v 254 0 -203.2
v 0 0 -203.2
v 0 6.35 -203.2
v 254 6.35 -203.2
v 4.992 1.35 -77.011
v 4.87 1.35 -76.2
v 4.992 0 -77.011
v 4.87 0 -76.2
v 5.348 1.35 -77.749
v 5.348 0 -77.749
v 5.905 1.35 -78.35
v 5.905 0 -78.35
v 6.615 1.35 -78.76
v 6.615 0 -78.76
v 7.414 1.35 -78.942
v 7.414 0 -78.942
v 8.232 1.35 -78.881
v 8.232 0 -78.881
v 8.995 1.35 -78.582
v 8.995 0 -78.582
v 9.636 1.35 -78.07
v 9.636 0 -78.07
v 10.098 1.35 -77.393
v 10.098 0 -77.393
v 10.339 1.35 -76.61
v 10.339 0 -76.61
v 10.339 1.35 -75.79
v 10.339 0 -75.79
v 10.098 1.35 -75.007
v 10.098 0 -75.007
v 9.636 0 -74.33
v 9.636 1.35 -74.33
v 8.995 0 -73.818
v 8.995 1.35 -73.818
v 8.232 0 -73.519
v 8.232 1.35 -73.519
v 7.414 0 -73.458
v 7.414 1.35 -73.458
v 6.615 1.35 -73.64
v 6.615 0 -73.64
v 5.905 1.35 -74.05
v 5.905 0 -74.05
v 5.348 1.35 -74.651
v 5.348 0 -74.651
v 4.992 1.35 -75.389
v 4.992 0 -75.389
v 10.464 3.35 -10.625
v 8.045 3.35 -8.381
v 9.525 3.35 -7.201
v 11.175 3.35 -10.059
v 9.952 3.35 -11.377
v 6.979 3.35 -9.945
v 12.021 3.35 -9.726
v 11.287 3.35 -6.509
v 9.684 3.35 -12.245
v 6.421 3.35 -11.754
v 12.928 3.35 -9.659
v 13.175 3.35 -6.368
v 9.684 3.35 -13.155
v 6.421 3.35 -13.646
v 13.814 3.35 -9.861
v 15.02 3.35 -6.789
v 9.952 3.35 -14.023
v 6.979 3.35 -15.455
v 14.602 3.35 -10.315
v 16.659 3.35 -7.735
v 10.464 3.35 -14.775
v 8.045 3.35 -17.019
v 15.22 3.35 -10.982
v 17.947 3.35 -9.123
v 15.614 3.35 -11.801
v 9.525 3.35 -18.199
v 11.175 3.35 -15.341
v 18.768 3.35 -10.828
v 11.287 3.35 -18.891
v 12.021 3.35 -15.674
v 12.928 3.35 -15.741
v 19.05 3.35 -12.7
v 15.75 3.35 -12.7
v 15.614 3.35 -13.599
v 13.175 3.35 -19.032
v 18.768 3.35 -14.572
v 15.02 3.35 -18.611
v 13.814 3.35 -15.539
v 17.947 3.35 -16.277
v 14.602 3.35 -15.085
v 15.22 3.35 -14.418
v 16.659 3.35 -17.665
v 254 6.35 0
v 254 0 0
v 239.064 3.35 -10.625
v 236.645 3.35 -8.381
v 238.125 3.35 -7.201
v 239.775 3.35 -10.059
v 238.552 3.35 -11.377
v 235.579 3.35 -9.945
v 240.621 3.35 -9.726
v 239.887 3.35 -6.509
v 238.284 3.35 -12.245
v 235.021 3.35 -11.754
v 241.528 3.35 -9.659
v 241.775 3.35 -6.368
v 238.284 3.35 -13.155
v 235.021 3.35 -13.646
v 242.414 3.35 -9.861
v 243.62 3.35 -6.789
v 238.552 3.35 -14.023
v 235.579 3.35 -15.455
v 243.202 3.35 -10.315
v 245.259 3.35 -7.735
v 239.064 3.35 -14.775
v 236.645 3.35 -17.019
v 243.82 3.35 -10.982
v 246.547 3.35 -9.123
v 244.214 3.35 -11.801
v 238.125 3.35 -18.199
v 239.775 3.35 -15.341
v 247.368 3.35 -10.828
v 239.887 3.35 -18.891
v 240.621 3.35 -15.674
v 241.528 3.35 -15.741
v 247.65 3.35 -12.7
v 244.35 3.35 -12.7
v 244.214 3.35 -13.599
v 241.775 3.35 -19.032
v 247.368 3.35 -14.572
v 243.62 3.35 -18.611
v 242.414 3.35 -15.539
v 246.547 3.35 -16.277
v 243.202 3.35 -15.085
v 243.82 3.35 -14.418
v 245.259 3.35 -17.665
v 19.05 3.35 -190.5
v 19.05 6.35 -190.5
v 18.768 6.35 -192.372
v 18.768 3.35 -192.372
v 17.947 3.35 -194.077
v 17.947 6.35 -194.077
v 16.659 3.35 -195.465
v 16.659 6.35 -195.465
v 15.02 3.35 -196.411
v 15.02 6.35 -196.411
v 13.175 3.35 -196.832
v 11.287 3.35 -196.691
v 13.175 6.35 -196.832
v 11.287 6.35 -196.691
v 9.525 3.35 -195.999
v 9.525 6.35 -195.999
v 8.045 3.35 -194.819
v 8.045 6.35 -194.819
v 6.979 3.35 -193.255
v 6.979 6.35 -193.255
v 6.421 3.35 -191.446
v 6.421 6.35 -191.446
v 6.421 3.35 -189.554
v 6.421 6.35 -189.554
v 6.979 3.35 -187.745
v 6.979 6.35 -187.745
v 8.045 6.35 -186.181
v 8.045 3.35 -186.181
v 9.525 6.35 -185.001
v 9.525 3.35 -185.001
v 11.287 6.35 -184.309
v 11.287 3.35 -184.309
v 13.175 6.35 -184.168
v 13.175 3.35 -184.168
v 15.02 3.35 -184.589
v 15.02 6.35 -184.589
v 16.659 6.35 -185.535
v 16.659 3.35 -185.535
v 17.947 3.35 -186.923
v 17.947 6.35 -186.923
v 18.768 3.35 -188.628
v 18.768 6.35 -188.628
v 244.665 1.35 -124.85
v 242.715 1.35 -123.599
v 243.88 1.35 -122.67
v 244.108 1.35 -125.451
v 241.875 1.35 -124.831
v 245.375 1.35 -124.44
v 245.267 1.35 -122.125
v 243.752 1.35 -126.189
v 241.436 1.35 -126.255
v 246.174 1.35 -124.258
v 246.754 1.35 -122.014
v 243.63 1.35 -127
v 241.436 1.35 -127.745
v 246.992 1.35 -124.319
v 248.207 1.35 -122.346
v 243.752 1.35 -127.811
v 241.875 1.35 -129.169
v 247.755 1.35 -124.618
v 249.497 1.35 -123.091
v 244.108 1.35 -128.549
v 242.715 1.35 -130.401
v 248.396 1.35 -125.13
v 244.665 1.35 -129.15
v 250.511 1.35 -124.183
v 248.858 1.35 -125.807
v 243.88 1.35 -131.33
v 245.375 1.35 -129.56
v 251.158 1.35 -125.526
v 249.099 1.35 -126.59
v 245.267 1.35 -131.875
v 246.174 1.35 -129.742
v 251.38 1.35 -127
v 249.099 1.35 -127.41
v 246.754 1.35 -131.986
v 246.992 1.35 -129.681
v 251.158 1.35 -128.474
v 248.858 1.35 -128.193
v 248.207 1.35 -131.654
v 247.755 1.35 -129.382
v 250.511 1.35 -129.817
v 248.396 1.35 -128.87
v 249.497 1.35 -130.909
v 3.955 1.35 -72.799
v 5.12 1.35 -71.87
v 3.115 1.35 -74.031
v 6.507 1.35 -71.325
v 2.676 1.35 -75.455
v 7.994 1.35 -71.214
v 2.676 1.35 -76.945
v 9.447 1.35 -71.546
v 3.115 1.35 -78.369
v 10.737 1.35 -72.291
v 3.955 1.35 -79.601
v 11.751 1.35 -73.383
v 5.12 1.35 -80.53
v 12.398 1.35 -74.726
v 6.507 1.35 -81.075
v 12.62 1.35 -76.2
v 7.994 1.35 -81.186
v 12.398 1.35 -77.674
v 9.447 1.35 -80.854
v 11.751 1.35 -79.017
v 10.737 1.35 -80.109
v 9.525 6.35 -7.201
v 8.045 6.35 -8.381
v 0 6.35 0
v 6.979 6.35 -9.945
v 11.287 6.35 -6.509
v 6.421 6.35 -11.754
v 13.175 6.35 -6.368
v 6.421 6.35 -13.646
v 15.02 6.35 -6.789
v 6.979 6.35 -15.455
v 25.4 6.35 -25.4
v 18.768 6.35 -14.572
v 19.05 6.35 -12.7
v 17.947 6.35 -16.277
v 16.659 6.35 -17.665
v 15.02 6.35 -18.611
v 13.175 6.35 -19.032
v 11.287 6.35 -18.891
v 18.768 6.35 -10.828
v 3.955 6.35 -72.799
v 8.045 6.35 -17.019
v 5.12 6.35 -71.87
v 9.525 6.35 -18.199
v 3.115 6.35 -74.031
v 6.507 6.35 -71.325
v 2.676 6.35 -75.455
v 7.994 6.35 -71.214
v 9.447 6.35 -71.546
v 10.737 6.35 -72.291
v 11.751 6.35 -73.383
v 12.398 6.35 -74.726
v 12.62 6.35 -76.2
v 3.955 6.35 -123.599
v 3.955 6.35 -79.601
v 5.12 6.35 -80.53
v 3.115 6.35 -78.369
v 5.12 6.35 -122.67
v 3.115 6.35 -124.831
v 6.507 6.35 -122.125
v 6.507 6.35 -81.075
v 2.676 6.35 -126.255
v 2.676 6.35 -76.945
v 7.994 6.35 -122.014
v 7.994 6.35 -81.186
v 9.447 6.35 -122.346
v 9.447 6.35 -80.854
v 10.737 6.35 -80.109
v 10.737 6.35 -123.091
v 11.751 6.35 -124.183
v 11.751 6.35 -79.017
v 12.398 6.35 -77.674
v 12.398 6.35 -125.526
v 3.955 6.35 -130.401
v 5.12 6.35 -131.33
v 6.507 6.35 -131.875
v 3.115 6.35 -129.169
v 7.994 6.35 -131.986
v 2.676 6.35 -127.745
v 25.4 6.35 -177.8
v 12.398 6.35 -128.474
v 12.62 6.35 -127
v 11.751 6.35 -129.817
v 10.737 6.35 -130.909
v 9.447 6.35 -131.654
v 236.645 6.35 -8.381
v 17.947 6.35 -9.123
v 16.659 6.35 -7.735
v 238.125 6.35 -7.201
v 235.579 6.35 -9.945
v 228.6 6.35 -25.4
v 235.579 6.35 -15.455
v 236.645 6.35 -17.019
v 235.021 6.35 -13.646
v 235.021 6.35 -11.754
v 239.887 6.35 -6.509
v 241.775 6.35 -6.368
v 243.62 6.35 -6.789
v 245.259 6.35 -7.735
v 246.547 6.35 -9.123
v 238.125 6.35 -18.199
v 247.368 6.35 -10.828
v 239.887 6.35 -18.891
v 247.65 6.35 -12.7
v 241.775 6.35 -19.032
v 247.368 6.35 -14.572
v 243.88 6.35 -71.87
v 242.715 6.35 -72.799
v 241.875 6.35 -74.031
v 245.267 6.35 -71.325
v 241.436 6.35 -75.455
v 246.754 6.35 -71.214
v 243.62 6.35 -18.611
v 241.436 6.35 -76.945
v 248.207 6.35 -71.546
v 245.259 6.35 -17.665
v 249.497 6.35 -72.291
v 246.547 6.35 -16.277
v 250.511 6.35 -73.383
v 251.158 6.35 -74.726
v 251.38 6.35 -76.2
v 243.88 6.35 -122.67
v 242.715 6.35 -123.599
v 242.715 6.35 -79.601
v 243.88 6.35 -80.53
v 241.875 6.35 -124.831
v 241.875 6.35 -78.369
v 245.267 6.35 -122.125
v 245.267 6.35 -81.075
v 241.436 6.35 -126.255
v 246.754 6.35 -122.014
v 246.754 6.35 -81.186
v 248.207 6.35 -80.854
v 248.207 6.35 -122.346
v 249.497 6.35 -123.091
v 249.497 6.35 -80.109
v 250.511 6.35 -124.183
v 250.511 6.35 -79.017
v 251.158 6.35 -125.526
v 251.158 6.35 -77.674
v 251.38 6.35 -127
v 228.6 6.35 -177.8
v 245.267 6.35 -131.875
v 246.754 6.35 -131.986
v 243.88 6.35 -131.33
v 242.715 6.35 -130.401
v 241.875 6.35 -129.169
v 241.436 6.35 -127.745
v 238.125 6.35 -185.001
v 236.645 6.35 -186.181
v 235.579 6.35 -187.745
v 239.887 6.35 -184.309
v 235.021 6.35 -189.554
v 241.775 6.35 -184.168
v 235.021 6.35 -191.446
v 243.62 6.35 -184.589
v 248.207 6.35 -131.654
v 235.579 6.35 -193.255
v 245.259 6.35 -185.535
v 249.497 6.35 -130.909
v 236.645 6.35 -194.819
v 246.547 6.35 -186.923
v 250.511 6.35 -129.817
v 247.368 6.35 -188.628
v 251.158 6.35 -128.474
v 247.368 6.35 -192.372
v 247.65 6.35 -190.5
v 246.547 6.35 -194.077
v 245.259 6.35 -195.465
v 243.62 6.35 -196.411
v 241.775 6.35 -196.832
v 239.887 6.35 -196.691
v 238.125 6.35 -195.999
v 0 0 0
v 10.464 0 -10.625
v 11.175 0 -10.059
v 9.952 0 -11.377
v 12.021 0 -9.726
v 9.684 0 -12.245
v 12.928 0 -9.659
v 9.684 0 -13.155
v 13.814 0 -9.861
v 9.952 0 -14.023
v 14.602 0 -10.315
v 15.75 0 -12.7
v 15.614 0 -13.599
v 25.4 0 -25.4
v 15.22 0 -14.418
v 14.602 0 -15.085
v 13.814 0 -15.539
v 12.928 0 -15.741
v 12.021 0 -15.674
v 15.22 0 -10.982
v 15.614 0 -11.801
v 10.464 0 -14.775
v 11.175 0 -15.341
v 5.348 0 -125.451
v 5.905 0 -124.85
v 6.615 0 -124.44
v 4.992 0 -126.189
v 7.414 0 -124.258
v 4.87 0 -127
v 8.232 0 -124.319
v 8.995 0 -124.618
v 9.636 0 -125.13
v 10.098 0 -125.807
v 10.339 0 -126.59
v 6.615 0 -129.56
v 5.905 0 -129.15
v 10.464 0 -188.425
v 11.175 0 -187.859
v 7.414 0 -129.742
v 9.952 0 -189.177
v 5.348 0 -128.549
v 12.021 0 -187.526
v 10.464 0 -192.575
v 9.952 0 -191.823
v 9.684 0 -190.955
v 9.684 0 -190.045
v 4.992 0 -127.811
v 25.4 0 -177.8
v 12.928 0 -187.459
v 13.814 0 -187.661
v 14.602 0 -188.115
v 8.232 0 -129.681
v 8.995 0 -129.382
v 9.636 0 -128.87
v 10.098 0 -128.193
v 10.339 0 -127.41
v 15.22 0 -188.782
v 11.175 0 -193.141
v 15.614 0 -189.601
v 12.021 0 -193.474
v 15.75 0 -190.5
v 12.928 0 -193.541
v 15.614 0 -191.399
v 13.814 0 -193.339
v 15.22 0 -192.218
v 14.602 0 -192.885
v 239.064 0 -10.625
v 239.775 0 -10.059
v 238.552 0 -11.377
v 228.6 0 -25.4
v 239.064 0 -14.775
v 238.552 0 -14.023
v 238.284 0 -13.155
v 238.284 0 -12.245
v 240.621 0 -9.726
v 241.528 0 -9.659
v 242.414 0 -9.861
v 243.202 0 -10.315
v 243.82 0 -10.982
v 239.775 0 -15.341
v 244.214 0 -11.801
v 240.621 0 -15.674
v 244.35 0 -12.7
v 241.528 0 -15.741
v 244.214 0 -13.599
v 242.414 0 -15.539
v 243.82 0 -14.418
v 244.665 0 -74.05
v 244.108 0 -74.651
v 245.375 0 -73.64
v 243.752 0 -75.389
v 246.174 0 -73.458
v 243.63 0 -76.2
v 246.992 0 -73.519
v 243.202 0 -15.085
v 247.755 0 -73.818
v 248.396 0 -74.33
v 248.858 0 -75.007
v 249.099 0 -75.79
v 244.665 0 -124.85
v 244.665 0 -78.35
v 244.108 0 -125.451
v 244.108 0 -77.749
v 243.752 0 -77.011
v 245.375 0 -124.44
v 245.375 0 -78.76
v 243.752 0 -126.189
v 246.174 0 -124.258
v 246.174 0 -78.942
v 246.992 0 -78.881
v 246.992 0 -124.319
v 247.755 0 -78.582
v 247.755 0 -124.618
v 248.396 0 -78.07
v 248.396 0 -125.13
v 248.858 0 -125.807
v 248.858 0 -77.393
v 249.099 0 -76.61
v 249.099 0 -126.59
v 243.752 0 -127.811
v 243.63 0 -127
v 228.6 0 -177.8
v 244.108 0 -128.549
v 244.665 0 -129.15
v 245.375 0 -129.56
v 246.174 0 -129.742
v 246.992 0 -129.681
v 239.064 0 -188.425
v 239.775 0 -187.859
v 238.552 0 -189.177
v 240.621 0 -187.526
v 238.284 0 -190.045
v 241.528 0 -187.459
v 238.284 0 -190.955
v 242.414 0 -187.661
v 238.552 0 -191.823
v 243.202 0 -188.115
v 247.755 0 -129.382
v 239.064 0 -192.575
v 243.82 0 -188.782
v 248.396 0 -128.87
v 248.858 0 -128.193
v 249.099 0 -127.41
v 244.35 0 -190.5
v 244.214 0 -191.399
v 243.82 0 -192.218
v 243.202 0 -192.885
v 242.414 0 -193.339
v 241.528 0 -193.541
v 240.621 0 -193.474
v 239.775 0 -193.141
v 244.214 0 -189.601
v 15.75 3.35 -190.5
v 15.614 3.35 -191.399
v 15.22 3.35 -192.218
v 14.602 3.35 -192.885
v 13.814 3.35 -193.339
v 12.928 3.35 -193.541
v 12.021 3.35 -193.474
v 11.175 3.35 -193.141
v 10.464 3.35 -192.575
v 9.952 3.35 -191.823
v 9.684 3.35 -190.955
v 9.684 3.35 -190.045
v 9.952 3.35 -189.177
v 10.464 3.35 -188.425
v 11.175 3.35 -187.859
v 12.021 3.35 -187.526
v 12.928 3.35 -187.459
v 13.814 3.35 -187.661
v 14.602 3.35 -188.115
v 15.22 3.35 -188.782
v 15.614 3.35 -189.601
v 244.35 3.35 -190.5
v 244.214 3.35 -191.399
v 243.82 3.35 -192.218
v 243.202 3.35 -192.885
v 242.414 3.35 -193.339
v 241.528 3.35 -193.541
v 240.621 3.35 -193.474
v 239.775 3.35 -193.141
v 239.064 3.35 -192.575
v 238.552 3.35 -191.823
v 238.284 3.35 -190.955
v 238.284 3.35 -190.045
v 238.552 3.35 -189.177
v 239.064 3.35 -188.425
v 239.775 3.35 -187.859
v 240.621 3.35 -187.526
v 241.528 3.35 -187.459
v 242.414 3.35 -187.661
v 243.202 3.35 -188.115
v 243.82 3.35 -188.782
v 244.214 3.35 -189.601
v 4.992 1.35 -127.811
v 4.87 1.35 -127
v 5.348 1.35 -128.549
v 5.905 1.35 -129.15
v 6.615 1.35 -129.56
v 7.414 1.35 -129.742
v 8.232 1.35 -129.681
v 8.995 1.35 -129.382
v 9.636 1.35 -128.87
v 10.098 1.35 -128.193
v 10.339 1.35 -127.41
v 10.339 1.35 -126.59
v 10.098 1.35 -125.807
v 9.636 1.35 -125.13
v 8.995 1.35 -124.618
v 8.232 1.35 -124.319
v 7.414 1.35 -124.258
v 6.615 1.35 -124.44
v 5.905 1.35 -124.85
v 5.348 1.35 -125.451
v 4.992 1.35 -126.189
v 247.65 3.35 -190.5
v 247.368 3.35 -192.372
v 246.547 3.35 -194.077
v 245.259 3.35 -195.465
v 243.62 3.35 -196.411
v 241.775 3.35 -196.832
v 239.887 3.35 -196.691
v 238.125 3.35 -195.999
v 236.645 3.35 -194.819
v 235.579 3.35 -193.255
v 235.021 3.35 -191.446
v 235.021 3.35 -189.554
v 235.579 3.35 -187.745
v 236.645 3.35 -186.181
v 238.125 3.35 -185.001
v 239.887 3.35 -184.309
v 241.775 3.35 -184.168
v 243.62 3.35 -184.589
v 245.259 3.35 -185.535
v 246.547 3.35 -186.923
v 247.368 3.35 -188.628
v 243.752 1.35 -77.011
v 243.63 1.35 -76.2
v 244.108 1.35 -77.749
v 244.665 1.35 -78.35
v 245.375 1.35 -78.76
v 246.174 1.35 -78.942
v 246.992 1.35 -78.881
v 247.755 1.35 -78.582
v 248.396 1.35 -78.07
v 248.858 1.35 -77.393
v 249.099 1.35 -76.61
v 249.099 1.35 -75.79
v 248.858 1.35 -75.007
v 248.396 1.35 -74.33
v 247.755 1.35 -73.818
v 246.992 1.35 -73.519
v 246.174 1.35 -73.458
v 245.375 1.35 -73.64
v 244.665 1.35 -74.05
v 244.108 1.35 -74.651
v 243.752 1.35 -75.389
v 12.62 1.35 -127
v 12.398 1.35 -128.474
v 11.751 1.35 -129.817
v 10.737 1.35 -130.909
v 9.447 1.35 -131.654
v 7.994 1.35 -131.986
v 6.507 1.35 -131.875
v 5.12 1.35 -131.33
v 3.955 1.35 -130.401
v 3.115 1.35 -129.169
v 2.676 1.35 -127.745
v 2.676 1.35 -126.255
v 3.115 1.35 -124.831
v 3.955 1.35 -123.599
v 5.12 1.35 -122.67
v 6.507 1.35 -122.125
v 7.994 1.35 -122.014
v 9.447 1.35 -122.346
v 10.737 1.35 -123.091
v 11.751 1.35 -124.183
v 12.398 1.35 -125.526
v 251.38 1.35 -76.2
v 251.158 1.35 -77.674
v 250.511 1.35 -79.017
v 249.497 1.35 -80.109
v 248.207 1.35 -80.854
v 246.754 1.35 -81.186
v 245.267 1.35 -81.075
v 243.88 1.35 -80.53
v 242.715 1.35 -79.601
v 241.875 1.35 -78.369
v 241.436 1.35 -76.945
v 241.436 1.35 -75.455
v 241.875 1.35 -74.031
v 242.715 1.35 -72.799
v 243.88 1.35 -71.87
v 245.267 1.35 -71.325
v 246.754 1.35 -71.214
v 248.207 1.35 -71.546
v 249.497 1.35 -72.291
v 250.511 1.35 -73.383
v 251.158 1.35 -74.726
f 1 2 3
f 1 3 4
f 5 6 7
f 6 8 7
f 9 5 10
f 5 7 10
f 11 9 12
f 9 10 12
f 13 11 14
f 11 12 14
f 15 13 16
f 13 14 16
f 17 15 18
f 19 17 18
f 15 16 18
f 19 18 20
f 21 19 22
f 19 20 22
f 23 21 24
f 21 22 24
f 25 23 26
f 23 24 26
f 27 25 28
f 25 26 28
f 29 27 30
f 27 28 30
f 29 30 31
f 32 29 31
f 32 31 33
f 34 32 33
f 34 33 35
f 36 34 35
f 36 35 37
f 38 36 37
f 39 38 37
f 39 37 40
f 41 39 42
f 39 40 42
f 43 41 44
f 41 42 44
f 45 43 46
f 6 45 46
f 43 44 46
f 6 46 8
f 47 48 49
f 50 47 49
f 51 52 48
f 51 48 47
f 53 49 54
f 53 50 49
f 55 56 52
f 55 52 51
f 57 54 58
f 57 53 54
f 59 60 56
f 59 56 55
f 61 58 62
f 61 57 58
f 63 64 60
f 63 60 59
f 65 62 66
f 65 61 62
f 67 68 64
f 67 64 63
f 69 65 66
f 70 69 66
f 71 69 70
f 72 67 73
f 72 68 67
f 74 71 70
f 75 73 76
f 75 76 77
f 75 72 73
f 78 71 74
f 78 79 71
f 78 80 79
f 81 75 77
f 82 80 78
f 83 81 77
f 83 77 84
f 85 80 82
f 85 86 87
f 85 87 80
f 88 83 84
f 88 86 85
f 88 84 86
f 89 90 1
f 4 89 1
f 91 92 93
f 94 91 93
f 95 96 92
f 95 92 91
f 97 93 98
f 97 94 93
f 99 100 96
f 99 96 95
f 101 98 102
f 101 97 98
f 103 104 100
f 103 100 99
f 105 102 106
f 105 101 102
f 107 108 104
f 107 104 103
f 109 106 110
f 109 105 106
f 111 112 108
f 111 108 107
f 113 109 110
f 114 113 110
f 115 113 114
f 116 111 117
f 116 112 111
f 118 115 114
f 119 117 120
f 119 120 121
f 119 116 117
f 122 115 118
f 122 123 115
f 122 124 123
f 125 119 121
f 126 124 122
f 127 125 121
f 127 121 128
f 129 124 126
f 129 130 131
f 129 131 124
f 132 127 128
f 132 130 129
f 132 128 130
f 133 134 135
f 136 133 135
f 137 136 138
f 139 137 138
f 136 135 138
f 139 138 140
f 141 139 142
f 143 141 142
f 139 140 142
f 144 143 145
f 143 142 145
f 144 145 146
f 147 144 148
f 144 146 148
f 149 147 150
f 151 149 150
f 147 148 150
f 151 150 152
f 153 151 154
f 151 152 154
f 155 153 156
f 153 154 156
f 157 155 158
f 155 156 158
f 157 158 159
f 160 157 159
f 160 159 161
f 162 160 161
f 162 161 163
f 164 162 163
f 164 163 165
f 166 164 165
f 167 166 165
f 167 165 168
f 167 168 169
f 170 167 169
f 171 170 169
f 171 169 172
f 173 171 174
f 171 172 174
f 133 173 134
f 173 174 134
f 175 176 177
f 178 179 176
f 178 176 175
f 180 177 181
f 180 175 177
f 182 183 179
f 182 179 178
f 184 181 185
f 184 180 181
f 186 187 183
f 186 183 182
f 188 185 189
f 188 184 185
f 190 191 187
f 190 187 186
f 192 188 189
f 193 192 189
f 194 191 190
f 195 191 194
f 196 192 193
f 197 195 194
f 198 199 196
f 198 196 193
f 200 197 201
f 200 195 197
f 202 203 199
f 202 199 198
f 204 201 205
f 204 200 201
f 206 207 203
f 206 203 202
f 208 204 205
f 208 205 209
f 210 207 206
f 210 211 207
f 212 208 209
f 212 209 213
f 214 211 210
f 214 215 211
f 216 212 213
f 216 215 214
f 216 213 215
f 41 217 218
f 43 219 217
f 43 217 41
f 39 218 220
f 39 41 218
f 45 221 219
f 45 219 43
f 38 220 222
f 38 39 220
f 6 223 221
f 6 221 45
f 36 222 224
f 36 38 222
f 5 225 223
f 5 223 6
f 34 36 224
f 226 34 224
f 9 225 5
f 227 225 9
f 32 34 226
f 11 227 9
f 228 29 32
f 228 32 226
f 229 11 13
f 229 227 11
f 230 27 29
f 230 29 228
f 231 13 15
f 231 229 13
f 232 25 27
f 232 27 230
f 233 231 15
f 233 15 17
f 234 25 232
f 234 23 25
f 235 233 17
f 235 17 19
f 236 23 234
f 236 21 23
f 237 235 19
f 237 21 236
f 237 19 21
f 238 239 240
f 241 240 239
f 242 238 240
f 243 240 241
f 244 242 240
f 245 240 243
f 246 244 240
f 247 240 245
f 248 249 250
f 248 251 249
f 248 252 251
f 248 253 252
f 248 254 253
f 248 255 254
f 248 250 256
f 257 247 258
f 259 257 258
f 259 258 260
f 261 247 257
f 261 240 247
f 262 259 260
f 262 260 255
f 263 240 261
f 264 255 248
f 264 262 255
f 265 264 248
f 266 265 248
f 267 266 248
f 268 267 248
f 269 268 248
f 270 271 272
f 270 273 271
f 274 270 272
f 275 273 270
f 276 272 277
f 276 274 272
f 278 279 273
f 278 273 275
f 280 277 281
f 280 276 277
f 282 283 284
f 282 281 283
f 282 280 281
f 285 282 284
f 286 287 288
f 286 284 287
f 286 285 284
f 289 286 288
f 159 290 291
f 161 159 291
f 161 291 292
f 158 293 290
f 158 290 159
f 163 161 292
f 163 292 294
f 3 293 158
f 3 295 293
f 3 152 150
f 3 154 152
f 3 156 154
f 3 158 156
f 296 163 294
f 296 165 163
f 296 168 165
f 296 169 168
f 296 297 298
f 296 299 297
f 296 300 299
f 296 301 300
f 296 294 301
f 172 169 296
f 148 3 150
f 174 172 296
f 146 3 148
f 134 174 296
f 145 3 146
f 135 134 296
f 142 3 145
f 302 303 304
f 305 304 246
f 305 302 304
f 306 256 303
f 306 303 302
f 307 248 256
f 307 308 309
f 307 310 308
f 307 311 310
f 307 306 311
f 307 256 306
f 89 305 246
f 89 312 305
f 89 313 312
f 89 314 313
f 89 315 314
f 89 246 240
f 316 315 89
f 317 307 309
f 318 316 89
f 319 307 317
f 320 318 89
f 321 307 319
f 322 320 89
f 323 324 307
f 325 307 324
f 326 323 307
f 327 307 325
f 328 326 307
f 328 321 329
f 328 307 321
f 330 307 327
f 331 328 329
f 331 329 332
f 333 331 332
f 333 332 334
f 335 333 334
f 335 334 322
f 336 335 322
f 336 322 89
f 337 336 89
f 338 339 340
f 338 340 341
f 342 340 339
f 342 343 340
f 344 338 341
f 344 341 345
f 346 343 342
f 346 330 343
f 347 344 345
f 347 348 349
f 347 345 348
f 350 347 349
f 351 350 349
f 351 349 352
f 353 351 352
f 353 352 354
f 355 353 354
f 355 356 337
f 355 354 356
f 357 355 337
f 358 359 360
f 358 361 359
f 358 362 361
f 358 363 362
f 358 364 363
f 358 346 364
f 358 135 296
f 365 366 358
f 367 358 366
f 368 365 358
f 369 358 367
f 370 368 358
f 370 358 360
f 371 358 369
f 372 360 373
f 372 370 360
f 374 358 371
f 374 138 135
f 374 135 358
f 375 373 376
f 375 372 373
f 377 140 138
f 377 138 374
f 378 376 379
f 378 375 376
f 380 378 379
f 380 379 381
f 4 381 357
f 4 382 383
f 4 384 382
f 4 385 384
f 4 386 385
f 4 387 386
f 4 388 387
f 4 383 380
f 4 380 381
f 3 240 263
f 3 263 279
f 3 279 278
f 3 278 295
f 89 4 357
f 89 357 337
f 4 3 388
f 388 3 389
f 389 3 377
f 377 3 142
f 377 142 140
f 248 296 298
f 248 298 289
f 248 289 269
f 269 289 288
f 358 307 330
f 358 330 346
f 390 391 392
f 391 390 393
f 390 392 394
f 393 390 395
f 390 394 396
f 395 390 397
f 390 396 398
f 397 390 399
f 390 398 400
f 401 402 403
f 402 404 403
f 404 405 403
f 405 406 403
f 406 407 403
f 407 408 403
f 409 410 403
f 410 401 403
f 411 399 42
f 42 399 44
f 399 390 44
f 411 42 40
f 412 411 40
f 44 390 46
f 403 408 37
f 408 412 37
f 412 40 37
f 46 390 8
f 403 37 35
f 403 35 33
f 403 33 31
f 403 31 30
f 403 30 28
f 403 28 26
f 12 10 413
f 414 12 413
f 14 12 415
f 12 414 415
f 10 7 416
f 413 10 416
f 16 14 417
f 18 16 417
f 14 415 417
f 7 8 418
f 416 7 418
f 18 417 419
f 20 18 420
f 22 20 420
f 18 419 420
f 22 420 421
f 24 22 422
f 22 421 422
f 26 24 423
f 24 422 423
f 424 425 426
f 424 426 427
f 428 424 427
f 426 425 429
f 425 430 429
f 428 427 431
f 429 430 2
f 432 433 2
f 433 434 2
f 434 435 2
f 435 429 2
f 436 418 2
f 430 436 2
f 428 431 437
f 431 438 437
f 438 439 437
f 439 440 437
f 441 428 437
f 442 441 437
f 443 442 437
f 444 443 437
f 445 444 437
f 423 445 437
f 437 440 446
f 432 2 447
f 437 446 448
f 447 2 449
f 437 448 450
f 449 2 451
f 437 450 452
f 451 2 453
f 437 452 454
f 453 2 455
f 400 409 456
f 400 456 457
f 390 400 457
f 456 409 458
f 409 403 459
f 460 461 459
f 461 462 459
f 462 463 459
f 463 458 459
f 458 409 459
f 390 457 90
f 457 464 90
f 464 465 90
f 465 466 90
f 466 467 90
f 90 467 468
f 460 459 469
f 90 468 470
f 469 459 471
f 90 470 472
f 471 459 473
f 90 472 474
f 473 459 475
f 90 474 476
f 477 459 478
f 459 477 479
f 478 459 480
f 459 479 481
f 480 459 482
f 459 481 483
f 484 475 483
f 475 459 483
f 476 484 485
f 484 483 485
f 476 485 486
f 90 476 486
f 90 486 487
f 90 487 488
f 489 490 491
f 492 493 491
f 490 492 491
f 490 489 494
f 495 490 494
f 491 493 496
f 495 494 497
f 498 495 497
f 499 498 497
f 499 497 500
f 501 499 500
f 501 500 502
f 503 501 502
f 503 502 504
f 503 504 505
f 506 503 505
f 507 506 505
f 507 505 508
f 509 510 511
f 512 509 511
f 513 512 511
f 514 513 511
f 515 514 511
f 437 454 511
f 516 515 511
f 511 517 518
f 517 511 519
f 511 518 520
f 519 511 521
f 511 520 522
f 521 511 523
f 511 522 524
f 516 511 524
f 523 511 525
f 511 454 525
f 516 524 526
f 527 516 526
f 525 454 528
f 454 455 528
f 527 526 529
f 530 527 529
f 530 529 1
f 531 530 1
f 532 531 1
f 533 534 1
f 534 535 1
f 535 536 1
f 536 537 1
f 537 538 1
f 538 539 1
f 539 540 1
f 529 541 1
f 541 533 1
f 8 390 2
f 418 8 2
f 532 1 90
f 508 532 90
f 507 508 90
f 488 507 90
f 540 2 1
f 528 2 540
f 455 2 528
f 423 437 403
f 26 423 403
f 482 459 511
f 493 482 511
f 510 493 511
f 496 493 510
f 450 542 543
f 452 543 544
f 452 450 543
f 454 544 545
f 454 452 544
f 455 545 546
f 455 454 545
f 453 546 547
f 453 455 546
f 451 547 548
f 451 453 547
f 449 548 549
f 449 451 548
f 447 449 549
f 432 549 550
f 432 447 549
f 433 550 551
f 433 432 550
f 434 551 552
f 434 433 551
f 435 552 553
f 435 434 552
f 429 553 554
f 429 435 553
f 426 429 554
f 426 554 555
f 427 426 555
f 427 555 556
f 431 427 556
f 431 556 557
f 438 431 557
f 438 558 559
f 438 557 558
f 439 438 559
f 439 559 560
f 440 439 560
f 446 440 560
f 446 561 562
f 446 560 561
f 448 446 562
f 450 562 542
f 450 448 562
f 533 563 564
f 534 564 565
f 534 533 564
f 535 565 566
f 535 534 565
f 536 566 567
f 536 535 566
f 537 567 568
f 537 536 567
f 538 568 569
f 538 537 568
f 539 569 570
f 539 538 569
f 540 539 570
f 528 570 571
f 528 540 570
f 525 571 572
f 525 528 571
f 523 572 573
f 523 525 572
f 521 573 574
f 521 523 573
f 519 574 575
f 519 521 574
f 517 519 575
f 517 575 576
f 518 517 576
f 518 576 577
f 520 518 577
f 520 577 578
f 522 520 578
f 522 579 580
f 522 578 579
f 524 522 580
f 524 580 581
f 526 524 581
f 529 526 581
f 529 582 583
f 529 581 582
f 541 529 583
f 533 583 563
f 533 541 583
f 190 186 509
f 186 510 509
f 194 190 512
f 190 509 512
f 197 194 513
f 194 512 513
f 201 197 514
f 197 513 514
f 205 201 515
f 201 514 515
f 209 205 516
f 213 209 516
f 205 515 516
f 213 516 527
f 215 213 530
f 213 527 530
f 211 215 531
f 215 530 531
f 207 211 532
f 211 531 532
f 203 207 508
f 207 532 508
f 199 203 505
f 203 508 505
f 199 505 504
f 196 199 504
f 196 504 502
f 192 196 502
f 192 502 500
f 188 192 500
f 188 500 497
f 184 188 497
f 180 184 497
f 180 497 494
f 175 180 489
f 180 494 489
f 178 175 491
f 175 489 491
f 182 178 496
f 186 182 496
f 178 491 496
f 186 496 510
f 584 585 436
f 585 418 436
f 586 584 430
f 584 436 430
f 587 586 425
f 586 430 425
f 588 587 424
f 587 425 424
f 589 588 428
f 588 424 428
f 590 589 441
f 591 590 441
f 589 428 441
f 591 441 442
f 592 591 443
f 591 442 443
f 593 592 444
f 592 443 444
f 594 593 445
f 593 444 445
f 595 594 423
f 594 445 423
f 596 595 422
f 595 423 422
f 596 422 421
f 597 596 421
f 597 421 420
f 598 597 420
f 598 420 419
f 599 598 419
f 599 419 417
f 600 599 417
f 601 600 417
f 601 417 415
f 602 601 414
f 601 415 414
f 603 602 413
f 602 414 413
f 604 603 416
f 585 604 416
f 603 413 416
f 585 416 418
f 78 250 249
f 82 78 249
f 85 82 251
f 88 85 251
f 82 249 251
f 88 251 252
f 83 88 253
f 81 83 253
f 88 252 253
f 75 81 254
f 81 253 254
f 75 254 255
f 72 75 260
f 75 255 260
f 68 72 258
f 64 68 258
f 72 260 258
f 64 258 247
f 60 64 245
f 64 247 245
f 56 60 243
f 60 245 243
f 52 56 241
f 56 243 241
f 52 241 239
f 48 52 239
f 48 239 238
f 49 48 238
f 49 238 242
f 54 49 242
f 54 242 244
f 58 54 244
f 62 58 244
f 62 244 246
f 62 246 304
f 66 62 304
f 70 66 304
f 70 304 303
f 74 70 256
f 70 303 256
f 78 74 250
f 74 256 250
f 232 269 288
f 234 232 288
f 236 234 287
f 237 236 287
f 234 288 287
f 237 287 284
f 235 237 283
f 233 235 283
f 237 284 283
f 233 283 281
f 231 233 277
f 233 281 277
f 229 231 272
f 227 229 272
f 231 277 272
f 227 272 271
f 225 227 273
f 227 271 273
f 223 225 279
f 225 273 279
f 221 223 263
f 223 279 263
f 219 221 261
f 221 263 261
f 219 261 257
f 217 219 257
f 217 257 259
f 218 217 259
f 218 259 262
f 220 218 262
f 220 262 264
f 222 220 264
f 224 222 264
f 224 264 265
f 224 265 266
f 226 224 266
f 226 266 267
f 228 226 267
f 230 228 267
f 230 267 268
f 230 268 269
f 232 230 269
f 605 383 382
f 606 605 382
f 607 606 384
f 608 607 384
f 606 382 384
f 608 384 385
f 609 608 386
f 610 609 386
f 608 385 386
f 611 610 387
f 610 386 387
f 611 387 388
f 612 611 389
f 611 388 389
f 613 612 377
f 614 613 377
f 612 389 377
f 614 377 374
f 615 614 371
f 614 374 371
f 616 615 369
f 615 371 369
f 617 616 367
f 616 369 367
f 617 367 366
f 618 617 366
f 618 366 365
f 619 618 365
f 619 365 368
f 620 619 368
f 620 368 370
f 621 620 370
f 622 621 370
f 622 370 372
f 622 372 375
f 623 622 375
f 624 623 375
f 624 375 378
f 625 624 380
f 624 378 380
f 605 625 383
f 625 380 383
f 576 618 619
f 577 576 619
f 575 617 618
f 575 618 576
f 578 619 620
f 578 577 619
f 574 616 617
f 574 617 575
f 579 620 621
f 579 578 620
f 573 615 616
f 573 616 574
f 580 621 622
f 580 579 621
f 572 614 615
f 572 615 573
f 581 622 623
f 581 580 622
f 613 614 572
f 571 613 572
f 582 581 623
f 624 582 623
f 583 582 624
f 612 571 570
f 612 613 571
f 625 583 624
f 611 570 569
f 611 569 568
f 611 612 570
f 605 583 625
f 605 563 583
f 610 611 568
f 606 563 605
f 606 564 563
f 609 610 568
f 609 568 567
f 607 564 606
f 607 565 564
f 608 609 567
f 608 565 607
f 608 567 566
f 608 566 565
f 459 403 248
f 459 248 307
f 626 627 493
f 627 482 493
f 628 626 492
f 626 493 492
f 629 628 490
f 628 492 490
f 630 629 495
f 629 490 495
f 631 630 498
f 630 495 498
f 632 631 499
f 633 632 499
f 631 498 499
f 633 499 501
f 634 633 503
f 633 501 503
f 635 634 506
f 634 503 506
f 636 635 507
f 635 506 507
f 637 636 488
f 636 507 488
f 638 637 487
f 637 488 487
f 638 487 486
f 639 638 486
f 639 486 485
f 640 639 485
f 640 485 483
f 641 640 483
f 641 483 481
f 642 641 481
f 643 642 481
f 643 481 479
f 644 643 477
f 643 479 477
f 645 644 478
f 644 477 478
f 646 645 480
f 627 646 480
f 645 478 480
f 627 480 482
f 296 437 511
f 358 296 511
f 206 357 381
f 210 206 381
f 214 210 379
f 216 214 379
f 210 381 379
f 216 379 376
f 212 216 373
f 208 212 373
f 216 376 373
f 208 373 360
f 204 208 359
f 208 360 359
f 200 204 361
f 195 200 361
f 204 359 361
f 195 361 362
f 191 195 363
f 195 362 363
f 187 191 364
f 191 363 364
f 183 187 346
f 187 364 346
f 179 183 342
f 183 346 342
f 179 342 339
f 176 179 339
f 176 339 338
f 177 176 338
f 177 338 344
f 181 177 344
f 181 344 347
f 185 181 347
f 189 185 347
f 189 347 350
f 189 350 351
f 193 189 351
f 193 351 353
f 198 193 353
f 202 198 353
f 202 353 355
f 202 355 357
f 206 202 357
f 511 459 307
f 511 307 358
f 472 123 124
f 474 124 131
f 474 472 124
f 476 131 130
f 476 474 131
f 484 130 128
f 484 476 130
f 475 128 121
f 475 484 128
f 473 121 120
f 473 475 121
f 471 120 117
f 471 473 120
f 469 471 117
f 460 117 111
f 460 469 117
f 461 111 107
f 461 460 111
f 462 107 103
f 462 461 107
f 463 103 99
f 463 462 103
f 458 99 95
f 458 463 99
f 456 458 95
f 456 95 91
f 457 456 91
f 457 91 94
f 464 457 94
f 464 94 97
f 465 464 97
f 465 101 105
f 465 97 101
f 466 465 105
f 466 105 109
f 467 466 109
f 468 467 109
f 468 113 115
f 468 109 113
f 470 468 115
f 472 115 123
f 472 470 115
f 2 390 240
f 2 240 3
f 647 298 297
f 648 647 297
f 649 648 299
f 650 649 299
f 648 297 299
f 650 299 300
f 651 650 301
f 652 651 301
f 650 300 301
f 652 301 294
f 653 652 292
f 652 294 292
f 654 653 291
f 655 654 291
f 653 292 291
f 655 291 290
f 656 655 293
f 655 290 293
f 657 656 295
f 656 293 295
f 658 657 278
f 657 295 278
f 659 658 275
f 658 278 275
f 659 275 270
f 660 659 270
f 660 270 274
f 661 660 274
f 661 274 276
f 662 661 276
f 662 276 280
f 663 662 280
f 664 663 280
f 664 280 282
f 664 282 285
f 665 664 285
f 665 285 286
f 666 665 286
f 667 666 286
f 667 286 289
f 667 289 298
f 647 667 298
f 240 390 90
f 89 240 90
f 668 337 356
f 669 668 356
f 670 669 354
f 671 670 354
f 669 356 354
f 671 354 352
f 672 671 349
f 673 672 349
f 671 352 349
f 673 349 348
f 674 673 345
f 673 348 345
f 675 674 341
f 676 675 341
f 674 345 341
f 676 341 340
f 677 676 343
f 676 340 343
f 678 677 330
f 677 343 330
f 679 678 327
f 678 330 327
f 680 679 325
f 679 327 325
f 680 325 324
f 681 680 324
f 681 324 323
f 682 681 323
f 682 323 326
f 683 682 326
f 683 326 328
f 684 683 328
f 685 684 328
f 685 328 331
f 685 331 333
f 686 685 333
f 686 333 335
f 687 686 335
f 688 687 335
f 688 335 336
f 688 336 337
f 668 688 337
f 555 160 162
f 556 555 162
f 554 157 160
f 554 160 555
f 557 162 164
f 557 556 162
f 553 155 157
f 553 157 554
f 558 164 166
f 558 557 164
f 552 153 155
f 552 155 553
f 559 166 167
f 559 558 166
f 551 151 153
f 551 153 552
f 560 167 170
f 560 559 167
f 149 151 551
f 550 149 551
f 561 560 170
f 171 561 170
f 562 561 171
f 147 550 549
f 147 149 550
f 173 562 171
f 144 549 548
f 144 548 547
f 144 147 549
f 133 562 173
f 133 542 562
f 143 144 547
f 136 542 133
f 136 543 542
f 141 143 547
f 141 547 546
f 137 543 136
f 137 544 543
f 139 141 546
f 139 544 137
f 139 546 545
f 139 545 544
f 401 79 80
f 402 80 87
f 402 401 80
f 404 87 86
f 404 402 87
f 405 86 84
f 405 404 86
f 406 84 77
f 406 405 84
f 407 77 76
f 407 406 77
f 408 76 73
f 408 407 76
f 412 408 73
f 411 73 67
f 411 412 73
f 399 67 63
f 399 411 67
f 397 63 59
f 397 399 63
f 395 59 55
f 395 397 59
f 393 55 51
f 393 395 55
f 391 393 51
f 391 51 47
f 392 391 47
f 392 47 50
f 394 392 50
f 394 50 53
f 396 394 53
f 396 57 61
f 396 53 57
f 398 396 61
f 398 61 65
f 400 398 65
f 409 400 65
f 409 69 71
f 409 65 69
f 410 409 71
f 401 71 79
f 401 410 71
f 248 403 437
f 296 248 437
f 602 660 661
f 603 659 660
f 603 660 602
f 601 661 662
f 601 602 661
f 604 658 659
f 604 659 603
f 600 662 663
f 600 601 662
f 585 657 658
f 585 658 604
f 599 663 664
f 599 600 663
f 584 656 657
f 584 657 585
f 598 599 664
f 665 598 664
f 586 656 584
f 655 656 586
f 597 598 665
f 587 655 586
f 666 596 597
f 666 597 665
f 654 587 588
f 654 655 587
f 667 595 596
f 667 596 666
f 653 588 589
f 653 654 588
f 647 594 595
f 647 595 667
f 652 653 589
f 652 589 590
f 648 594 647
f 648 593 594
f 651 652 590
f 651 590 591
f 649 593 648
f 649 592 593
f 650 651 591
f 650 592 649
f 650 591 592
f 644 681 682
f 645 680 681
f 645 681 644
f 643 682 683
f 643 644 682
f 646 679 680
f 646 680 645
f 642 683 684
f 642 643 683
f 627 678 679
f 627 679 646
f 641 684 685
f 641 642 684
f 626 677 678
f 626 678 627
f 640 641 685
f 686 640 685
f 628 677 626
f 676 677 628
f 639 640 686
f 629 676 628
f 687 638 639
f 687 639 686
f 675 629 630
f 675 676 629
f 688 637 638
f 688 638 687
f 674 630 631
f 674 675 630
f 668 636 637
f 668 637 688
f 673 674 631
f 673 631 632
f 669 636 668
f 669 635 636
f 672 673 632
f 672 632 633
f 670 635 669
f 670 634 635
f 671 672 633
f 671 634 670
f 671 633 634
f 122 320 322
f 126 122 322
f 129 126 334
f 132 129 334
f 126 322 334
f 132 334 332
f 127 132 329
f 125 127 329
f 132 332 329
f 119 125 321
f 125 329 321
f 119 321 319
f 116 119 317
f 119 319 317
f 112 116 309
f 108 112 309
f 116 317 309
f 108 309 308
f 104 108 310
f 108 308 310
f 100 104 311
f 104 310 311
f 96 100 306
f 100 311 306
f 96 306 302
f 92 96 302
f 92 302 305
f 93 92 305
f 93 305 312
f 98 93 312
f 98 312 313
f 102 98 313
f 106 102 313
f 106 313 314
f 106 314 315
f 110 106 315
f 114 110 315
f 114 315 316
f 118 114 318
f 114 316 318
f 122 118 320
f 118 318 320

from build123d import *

# Parameters (mm, degrees)
SKETCH1_W                      = 254
SKETCH1_H                      = 203.2
SKETCH1_R                      = 3.05
SKETCH1_W_2                    = 203.2
SKETCH1_H_2                    = 152.4
BOSS_EXTRUDE1_DEPTH            = 6.35
SKETCH2_R                      = 6.35
CUT_EXTRUDE1_DEPTH             = 3
CBORE_FOR_M5_SHCS1_D           = 5.5
CBORE_FOR_M5_SHCS1_CBORE_D     = 10
CBORE_FOR_M5_SHCS1_CBORE_DEPTH = 5


with BuildPart() as part:
    # Sketch1 → Boss-Extrude1 (new body)
    with BuildSketch(Plane(origin=(0, 0, 0), x_dir=(1, 0, 0), z_dir=(0, 1, 0))):
        with Locations((127, 101.6)):
            Rectangle(SKETCH1_W, SKETCH1_H)
        with Locations((12.7, 190.5)):
            Circle(SKETCH1_R, mode=Mode.SUBTRACT)
        with Locations((241.3, 190.5)):
            Circle(SKETCH1_R, mode=Mode.SUBTRACT)
        with Locations((241.3, 12.7)):
            Circle(SKETCH1_R, mode=Mode.SUBTRACT)
        with Locations((12.7, 12.7)):
            Circle(SKETCH1_R, mode=Mode.SUBTRACT)
        with Locations((127, 101.6)):
            Rectangle(SKETCH1_W_2, SKETCH1_H_2, mode=Mode.SUBTRACT)
    extrude(amount=BOSS_EXTRUDE1_DEPTH)

    # Sketch2 → Cut-Extrude1 (cut)
    with BuildSketch(Plane(origin=(0, 6.35, 0), x_dir=(1, 0, 0), z_dir=(0, 1, 0))):
        with Locations((12.7, 190.5)):
            Circle(SKETCH2_R)
        with Locations((241.3, 190.5)):
            Circle(SKETCH2_R)
        with Locations((241.3, 12.7)):
            Circle(SKETCH2_R)
        with Locations((12.7, 12.7)):
            Circle(SKETCH2_R)
    extrude(amount=-CUT_EXTRUDE1_DEPTH, mode=Mode.SUBTRACT)

    # CBORE for M5 SHCS1 (through all)
    with Locations(Plane(origin=(0, 6.35, 0), x_dir=(1, 0, 0), z_dir=(0, 1, 0))):
        with Locations((246.38, 76.2), (246.38, 127), (7.62, 76.2), (7.62, 127)):
            CounterBoreHole(CBORE_FOR_M5_SHCS1_D / 2, CBORE_FOR_M5_SHCS1_CBORE_D / 2, CBORE_FOR_M5_SHCS1_CBORE_DEPTH)


solid = part.part
